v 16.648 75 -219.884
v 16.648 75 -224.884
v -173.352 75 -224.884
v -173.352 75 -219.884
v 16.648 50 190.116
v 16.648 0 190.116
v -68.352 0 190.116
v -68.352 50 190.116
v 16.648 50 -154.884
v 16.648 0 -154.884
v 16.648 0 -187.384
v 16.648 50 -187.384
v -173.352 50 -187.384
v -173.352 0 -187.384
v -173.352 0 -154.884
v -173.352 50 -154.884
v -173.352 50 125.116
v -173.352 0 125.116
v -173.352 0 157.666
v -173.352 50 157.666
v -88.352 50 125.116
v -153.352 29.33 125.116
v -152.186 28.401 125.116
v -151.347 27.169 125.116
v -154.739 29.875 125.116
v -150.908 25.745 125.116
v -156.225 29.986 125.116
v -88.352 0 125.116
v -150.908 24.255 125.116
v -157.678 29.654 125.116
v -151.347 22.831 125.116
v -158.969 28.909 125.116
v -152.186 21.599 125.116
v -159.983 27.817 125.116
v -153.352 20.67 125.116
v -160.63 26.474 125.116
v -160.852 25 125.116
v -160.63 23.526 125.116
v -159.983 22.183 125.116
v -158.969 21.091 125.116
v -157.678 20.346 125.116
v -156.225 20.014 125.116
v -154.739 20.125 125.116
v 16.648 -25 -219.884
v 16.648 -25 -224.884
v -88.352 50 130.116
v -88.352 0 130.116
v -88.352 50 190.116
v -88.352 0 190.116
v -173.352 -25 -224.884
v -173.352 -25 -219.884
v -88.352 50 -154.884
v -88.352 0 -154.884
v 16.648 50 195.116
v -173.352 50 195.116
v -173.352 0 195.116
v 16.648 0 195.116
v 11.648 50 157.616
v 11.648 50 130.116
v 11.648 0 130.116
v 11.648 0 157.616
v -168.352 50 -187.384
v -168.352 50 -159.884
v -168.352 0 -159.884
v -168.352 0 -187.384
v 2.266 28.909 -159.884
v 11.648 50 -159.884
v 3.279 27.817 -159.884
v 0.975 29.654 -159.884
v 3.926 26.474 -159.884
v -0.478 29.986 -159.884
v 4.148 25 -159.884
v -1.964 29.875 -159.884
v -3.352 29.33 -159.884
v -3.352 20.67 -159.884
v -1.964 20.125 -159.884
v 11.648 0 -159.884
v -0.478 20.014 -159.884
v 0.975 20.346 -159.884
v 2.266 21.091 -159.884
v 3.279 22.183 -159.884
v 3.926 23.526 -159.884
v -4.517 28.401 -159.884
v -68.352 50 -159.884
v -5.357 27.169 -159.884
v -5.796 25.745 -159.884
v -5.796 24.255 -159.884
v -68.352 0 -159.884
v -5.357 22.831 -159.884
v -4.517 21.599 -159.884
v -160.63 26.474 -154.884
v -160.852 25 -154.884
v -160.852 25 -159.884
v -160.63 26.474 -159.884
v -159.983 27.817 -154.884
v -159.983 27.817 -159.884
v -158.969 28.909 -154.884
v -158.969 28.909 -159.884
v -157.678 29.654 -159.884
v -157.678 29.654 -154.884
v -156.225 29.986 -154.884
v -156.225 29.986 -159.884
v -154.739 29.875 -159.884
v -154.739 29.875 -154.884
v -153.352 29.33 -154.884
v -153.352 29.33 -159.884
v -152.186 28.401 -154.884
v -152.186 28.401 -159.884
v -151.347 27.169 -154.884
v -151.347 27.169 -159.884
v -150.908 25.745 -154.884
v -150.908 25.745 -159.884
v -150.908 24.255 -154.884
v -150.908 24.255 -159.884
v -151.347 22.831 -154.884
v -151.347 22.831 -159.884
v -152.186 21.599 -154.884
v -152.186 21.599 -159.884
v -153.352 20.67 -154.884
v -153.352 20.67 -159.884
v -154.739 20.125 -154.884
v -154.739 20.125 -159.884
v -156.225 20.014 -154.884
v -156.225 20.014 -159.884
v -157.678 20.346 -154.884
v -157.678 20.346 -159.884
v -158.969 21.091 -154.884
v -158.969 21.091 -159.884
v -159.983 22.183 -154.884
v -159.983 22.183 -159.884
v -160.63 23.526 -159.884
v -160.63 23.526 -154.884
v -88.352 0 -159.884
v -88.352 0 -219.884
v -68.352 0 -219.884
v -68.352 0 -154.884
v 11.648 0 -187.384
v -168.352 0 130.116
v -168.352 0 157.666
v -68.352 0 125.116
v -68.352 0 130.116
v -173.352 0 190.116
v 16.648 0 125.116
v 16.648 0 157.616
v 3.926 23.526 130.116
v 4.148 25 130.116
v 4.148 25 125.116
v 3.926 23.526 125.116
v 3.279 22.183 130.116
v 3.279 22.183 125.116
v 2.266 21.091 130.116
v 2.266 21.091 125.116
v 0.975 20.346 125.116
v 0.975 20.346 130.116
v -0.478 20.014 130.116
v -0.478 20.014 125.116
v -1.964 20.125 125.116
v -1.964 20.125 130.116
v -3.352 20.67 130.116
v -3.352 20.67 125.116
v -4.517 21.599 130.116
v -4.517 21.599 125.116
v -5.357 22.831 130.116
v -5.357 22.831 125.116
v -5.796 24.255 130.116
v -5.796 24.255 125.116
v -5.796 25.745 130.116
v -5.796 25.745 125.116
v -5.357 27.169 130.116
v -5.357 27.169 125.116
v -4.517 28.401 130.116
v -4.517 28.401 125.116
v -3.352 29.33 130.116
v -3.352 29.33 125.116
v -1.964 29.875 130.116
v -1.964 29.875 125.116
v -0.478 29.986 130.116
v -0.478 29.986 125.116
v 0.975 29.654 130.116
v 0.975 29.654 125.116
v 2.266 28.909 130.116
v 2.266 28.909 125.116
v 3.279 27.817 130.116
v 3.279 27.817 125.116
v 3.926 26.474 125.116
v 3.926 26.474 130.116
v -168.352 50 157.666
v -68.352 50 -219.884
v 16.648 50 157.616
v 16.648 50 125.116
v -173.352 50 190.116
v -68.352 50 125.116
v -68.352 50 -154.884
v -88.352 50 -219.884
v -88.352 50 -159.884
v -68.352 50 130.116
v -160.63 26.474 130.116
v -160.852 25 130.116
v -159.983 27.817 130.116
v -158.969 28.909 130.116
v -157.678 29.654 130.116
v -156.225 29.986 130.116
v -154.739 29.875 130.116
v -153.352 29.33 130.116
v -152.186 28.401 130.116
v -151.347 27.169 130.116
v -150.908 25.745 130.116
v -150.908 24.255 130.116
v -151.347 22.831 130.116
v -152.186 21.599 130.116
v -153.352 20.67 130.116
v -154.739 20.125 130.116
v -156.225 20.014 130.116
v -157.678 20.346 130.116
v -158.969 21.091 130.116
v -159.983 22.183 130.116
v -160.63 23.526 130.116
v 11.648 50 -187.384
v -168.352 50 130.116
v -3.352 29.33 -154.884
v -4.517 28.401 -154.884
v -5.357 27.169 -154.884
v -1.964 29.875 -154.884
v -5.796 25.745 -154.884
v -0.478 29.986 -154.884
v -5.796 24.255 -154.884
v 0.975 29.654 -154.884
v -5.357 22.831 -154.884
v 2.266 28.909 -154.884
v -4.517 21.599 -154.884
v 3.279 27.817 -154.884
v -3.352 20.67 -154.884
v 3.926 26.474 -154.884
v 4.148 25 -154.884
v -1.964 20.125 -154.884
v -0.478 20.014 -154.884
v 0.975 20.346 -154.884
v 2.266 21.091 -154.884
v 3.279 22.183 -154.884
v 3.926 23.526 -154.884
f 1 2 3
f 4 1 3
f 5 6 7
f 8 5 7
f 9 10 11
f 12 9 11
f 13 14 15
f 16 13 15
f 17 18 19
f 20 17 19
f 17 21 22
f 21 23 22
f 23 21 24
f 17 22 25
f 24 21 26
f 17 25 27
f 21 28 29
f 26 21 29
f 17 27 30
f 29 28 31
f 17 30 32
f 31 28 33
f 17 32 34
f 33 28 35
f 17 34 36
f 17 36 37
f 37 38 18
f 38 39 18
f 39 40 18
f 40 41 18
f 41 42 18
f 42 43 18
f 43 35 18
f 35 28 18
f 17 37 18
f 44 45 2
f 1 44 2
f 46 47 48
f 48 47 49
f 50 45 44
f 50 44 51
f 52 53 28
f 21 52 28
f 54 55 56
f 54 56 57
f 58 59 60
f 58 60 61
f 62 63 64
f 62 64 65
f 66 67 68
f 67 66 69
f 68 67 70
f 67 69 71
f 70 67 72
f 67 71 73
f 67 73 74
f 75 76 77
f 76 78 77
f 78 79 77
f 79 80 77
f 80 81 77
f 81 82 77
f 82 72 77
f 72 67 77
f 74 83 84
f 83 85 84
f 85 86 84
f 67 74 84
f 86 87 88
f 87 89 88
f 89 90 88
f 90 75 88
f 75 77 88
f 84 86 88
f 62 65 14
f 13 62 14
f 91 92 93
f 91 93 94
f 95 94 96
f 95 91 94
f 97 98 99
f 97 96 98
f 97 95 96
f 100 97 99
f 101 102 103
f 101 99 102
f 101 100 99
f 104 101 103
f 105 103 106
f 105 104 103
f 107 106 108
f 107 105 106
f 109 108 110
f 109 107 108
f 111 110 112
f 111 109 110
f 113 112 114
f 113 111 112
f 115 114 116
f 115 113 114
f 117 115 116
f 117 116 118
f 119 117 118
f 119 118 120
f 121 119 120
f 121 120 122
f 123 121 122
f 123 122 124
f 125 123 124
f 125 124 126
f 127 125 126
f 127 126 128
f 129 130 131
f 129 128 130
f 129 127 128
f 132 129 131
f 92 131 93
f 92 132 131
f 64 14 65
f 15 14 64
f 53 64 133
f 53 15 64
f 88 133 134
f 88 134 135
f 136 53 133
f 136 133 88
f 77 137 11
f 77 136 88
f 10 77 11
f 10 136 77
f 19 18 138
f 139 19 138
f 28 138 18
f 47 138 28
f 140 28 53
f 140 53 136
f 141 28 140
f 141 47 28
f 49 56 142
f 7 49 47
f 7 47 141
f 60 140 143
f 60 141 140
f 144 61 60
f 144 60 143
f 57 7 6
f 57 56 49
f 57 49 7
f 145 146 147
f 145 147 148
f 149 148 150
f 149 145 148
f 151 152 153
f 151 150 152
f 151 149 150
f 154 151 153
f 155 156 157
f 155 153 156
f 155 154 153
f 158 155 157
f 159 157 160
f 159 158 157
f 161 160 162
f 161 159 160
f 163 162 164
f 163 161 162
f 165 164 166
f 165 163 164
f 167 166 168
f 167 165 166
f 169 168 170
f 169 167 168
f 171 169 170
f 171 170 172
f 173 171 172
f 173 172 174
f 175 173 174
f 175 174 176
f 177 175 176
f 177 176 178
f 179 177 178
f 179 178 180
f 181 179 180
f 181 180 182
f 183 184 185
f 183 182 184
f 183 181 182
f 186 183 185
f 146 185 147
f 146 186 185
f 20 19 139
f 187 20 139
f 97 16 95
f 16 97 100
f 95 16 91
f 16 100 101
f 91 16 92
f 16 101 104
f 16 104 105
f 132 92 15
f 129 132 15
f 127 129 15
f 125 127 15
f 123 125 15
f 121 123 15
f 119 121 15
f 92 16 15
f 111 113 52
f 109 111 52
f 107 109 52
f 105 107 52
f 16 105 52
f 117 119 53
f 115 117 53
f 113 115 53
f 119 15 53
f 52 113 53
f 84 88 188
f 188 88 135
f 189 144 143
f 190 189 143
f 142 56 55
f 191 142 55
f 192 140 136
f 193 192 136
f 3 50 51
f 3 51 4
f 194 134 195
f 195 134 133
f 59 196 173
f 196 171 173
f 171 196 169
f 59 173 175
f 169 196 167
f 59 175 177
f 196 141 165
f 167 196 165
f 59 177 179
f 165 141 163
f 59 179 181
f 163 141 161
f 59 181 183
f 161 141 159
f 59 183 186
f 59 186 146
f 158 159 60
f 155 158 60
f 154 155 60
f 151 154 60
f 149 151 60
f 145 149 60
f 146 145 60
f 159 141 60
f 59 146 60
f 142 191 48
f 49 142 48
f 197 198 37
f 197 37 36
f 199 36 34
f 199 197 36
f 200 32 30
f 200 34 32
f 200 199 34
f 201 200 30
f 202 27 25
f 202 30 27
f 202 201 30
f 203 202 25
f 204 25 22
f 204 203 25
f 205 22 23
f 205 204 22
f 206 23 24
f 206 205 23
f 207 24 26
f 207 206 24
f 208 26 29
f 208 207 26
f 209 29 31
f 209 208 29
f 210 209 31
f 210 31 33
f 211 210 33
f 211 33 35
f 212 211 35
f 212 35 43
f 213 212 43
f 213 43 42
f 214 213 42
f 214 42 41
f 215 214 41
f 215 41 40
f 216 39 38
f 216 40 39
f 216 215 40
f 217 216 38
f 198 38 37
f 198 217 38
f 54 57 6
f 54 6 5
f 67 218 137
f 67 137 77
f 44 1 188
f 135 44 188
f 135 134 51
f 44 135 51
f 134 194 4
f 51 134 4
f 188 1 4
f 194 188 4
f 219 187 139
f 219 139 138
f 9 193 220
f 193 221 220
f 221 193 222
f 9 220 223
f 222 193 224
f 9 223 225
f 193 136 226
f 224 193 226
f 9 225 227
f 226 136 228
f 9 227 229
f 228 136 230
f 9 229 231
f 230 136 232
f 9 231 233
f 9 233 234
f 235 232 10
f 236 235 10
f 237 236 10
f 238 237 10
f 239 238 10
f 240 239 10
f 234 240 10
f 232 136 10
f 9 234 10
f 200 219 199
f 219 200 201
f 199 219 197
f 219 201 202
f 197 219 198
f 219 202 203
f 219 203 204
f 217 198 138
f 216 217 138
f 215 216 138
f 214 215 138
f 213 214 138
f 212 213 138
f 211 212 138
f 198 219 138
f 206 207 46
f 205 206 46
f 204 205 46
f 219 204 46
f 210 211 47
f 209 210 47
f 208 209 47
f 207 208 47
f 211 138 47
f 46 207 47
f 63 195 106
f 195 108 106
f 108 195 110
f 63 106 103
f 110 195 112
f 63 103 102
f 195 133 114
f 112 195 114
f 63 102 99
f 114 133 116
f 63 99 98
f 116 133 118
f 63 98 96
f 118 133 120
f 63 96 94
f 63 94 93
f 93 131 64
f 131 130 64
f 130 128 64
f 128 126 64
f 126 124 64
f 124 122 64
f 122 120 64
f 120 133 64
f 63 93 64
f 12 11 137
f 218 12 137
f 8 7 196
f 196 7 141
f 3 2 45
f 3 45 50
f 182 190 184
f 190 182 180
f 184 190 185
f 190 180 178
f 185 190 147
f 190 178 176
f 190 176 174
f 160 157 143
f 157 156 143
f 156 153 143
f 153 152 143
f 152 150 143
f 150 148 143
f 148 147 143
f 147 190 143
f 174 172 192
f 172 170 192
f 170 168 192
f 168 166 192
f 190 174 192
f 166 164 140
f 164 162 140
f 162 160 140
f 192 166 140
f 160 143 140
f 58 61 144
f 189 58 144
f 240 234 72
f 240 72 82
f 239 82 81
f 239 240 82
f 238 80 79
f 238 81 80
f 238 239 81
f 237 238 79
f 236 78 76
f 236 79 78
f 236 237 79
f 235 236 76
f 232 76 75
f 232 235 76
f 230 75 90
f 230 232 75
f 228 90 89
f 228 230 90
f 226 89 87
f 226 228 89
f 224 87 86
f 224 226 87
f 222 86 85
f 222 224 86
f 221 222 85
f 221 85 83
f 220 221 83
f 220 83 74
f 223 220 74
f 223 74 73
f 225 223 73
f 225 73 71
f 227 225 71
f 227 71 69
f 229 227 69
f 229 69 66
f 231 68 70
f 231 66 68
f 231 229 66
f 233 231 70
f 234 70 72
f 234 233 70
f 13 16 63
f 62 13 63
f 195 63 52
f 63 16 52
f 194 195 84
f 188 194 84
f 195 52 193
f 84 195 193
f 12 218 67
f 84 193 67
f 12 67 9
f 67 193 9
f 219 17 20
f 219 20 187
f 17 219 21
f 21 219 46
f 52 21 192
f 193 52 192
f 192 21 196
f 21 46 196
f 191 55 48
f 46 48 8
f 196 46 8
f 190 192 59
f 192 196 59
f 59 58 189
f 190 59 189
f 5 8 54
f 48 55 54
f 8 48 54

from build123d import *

# Parameters (mm, degrees)
BOSS_EXTRUDE1_DEPTH     = 50
SKETCH2_W               = 190
SKETCH2_H               = 100
BOSS_EXTRUDE2_DEPTH     = 5
SKETCH3_W               = 190
SKETCH3_H               = 50
BOSS_EXTRUDE3_DEPTH     = 5
CUT_EXTRUDE1_DEPTH      = 291
CUT_EXTRUDE1_DEPTH_BACK = 20
SKETCH4_R               = 5
CUT_EXTRUDE2_DEPTH      = 291
CUT_EXTRUDE2_DEPTH_BACK = 21
SKETCH5_R               = 5


with BuildPart() as part:
    # Sketch1 → Boss-Extrude1 (new body)
    with BuildSketch(Plane(origin=(0, 0, 0), x_dir=(1, 0, 0), z_dir=(0, 1, 0))):
        Polygon((-68.351724138, 159.884429765), (-68.351724138, 219.884429765), (-38.351724138, 219.884429765), (-38.351724138, 224.884429765), (-118.351724138, 224.884429765), (-118.351724138, 219.884429765), (-88.351724138, 219.884429765), (-88.351724138, 159.884429765), (-168.351724138, 159.884429765), (-168.351724138, 187.384429765), (-173.351724138, 187.384429765), (-173.351724138, 154.884429765), (-88.351724138, 154.884429765), (-88.351724138, -125.115570235), (-173.351724138, -125.115570235), (-173.351724138, -157.665570235), (-168.351724138, -157.665570235), (-168.351724138, -130.115570235), (-88.351724138, -130.115570235), (-88.351724138, -190.115570235), (-118.351724138, -190.115570235), (-118.351724138, -195.115570235), (-38.351724138, -195.115570235), (-38.351724138, -190.115570235), (-68.351724138, -190.115570235), (-68.351724138, -130.115570235), (11.648275862, -130.115570235), (11.648275862, -157.615570235), (16.648275862, -157.615570235), (16.648275862, -125.115570235), (-68.351724138, -125.115570235), (-68.351724138, 154.884429765), (16.648275862, 154.884429765), (16.648275862, 187.384429765), (11.648275862, 187.384429765), (11.648275862, 159.884429765), align=None)
    extrude(amount=BOSS_EXTRUDE1_DEPTH)

    # Sketch2 → Boss-Extrude2 (add)
    with BuildSketch(Plane(origin=(0, 0, -224.884429765), x_dir=(-1, 0, 0), z_dir=(0, 0, -1))):
        with Locations((78.351724138, 25)):
            Rectangle(SKETCH2_W, SKETCH2_H)
    extrude(amount=-BOSS_EXTRUDE2_DEPTH)

    # Sketch3 → Boss-Extrude3 (add)
    with BuildSketch(Plane.XY.offset(195.115570235)):
        with Locations((-78.351724138, 25)):
            Rectangle(SKETCH3_W, SKETCH3_H)
    extrude(amount=-BOSS_EXTRUDE3_DEPTH)

    # Sketch4 → Cut-Extrude1 (cut, two sides: drawn at the far end of the back side and taken through both)
    with BuildSketch(Plane(origin=(0, 0, 125.115570235), x_dir=(-1, 0, 0), z_dir=(0, 0, -1)).offset(-CUT_EXTRUDE1_DEPTH_BACK)):
        with Locations((155.851724138, 25)):
            Circle(SKETCH4_R)
    extrude(amount=CUT_EXTRUDE1_DEPTH + CUT_EXTRUDE1_DEPTH_BACK, mode=Mode.SUBTRACT)

    # Sketch5 → Cut-Extrude2 (cut, two sides: drawn at the far end of the back side and taken through both)
    with BuildSketch(Plane(origin=(0, 0, 125.115570235), x_dir=(-1, 0, 0), z_dir=(0, 0, -1)).offset(-CUT_EXTRUDE2_DEPTH_BACK)):
        with Locations(Location((0.851724138, 25, 0), (0, 0, 180))):
            Circle(SKETCH5_R)
    extrude(amount=CUT_EXTRUDE2_DEPTH + CUT_EXTRUDE2_DEPTH_BACK, mode=Mode.SUBTRACT)


solid = part.part
